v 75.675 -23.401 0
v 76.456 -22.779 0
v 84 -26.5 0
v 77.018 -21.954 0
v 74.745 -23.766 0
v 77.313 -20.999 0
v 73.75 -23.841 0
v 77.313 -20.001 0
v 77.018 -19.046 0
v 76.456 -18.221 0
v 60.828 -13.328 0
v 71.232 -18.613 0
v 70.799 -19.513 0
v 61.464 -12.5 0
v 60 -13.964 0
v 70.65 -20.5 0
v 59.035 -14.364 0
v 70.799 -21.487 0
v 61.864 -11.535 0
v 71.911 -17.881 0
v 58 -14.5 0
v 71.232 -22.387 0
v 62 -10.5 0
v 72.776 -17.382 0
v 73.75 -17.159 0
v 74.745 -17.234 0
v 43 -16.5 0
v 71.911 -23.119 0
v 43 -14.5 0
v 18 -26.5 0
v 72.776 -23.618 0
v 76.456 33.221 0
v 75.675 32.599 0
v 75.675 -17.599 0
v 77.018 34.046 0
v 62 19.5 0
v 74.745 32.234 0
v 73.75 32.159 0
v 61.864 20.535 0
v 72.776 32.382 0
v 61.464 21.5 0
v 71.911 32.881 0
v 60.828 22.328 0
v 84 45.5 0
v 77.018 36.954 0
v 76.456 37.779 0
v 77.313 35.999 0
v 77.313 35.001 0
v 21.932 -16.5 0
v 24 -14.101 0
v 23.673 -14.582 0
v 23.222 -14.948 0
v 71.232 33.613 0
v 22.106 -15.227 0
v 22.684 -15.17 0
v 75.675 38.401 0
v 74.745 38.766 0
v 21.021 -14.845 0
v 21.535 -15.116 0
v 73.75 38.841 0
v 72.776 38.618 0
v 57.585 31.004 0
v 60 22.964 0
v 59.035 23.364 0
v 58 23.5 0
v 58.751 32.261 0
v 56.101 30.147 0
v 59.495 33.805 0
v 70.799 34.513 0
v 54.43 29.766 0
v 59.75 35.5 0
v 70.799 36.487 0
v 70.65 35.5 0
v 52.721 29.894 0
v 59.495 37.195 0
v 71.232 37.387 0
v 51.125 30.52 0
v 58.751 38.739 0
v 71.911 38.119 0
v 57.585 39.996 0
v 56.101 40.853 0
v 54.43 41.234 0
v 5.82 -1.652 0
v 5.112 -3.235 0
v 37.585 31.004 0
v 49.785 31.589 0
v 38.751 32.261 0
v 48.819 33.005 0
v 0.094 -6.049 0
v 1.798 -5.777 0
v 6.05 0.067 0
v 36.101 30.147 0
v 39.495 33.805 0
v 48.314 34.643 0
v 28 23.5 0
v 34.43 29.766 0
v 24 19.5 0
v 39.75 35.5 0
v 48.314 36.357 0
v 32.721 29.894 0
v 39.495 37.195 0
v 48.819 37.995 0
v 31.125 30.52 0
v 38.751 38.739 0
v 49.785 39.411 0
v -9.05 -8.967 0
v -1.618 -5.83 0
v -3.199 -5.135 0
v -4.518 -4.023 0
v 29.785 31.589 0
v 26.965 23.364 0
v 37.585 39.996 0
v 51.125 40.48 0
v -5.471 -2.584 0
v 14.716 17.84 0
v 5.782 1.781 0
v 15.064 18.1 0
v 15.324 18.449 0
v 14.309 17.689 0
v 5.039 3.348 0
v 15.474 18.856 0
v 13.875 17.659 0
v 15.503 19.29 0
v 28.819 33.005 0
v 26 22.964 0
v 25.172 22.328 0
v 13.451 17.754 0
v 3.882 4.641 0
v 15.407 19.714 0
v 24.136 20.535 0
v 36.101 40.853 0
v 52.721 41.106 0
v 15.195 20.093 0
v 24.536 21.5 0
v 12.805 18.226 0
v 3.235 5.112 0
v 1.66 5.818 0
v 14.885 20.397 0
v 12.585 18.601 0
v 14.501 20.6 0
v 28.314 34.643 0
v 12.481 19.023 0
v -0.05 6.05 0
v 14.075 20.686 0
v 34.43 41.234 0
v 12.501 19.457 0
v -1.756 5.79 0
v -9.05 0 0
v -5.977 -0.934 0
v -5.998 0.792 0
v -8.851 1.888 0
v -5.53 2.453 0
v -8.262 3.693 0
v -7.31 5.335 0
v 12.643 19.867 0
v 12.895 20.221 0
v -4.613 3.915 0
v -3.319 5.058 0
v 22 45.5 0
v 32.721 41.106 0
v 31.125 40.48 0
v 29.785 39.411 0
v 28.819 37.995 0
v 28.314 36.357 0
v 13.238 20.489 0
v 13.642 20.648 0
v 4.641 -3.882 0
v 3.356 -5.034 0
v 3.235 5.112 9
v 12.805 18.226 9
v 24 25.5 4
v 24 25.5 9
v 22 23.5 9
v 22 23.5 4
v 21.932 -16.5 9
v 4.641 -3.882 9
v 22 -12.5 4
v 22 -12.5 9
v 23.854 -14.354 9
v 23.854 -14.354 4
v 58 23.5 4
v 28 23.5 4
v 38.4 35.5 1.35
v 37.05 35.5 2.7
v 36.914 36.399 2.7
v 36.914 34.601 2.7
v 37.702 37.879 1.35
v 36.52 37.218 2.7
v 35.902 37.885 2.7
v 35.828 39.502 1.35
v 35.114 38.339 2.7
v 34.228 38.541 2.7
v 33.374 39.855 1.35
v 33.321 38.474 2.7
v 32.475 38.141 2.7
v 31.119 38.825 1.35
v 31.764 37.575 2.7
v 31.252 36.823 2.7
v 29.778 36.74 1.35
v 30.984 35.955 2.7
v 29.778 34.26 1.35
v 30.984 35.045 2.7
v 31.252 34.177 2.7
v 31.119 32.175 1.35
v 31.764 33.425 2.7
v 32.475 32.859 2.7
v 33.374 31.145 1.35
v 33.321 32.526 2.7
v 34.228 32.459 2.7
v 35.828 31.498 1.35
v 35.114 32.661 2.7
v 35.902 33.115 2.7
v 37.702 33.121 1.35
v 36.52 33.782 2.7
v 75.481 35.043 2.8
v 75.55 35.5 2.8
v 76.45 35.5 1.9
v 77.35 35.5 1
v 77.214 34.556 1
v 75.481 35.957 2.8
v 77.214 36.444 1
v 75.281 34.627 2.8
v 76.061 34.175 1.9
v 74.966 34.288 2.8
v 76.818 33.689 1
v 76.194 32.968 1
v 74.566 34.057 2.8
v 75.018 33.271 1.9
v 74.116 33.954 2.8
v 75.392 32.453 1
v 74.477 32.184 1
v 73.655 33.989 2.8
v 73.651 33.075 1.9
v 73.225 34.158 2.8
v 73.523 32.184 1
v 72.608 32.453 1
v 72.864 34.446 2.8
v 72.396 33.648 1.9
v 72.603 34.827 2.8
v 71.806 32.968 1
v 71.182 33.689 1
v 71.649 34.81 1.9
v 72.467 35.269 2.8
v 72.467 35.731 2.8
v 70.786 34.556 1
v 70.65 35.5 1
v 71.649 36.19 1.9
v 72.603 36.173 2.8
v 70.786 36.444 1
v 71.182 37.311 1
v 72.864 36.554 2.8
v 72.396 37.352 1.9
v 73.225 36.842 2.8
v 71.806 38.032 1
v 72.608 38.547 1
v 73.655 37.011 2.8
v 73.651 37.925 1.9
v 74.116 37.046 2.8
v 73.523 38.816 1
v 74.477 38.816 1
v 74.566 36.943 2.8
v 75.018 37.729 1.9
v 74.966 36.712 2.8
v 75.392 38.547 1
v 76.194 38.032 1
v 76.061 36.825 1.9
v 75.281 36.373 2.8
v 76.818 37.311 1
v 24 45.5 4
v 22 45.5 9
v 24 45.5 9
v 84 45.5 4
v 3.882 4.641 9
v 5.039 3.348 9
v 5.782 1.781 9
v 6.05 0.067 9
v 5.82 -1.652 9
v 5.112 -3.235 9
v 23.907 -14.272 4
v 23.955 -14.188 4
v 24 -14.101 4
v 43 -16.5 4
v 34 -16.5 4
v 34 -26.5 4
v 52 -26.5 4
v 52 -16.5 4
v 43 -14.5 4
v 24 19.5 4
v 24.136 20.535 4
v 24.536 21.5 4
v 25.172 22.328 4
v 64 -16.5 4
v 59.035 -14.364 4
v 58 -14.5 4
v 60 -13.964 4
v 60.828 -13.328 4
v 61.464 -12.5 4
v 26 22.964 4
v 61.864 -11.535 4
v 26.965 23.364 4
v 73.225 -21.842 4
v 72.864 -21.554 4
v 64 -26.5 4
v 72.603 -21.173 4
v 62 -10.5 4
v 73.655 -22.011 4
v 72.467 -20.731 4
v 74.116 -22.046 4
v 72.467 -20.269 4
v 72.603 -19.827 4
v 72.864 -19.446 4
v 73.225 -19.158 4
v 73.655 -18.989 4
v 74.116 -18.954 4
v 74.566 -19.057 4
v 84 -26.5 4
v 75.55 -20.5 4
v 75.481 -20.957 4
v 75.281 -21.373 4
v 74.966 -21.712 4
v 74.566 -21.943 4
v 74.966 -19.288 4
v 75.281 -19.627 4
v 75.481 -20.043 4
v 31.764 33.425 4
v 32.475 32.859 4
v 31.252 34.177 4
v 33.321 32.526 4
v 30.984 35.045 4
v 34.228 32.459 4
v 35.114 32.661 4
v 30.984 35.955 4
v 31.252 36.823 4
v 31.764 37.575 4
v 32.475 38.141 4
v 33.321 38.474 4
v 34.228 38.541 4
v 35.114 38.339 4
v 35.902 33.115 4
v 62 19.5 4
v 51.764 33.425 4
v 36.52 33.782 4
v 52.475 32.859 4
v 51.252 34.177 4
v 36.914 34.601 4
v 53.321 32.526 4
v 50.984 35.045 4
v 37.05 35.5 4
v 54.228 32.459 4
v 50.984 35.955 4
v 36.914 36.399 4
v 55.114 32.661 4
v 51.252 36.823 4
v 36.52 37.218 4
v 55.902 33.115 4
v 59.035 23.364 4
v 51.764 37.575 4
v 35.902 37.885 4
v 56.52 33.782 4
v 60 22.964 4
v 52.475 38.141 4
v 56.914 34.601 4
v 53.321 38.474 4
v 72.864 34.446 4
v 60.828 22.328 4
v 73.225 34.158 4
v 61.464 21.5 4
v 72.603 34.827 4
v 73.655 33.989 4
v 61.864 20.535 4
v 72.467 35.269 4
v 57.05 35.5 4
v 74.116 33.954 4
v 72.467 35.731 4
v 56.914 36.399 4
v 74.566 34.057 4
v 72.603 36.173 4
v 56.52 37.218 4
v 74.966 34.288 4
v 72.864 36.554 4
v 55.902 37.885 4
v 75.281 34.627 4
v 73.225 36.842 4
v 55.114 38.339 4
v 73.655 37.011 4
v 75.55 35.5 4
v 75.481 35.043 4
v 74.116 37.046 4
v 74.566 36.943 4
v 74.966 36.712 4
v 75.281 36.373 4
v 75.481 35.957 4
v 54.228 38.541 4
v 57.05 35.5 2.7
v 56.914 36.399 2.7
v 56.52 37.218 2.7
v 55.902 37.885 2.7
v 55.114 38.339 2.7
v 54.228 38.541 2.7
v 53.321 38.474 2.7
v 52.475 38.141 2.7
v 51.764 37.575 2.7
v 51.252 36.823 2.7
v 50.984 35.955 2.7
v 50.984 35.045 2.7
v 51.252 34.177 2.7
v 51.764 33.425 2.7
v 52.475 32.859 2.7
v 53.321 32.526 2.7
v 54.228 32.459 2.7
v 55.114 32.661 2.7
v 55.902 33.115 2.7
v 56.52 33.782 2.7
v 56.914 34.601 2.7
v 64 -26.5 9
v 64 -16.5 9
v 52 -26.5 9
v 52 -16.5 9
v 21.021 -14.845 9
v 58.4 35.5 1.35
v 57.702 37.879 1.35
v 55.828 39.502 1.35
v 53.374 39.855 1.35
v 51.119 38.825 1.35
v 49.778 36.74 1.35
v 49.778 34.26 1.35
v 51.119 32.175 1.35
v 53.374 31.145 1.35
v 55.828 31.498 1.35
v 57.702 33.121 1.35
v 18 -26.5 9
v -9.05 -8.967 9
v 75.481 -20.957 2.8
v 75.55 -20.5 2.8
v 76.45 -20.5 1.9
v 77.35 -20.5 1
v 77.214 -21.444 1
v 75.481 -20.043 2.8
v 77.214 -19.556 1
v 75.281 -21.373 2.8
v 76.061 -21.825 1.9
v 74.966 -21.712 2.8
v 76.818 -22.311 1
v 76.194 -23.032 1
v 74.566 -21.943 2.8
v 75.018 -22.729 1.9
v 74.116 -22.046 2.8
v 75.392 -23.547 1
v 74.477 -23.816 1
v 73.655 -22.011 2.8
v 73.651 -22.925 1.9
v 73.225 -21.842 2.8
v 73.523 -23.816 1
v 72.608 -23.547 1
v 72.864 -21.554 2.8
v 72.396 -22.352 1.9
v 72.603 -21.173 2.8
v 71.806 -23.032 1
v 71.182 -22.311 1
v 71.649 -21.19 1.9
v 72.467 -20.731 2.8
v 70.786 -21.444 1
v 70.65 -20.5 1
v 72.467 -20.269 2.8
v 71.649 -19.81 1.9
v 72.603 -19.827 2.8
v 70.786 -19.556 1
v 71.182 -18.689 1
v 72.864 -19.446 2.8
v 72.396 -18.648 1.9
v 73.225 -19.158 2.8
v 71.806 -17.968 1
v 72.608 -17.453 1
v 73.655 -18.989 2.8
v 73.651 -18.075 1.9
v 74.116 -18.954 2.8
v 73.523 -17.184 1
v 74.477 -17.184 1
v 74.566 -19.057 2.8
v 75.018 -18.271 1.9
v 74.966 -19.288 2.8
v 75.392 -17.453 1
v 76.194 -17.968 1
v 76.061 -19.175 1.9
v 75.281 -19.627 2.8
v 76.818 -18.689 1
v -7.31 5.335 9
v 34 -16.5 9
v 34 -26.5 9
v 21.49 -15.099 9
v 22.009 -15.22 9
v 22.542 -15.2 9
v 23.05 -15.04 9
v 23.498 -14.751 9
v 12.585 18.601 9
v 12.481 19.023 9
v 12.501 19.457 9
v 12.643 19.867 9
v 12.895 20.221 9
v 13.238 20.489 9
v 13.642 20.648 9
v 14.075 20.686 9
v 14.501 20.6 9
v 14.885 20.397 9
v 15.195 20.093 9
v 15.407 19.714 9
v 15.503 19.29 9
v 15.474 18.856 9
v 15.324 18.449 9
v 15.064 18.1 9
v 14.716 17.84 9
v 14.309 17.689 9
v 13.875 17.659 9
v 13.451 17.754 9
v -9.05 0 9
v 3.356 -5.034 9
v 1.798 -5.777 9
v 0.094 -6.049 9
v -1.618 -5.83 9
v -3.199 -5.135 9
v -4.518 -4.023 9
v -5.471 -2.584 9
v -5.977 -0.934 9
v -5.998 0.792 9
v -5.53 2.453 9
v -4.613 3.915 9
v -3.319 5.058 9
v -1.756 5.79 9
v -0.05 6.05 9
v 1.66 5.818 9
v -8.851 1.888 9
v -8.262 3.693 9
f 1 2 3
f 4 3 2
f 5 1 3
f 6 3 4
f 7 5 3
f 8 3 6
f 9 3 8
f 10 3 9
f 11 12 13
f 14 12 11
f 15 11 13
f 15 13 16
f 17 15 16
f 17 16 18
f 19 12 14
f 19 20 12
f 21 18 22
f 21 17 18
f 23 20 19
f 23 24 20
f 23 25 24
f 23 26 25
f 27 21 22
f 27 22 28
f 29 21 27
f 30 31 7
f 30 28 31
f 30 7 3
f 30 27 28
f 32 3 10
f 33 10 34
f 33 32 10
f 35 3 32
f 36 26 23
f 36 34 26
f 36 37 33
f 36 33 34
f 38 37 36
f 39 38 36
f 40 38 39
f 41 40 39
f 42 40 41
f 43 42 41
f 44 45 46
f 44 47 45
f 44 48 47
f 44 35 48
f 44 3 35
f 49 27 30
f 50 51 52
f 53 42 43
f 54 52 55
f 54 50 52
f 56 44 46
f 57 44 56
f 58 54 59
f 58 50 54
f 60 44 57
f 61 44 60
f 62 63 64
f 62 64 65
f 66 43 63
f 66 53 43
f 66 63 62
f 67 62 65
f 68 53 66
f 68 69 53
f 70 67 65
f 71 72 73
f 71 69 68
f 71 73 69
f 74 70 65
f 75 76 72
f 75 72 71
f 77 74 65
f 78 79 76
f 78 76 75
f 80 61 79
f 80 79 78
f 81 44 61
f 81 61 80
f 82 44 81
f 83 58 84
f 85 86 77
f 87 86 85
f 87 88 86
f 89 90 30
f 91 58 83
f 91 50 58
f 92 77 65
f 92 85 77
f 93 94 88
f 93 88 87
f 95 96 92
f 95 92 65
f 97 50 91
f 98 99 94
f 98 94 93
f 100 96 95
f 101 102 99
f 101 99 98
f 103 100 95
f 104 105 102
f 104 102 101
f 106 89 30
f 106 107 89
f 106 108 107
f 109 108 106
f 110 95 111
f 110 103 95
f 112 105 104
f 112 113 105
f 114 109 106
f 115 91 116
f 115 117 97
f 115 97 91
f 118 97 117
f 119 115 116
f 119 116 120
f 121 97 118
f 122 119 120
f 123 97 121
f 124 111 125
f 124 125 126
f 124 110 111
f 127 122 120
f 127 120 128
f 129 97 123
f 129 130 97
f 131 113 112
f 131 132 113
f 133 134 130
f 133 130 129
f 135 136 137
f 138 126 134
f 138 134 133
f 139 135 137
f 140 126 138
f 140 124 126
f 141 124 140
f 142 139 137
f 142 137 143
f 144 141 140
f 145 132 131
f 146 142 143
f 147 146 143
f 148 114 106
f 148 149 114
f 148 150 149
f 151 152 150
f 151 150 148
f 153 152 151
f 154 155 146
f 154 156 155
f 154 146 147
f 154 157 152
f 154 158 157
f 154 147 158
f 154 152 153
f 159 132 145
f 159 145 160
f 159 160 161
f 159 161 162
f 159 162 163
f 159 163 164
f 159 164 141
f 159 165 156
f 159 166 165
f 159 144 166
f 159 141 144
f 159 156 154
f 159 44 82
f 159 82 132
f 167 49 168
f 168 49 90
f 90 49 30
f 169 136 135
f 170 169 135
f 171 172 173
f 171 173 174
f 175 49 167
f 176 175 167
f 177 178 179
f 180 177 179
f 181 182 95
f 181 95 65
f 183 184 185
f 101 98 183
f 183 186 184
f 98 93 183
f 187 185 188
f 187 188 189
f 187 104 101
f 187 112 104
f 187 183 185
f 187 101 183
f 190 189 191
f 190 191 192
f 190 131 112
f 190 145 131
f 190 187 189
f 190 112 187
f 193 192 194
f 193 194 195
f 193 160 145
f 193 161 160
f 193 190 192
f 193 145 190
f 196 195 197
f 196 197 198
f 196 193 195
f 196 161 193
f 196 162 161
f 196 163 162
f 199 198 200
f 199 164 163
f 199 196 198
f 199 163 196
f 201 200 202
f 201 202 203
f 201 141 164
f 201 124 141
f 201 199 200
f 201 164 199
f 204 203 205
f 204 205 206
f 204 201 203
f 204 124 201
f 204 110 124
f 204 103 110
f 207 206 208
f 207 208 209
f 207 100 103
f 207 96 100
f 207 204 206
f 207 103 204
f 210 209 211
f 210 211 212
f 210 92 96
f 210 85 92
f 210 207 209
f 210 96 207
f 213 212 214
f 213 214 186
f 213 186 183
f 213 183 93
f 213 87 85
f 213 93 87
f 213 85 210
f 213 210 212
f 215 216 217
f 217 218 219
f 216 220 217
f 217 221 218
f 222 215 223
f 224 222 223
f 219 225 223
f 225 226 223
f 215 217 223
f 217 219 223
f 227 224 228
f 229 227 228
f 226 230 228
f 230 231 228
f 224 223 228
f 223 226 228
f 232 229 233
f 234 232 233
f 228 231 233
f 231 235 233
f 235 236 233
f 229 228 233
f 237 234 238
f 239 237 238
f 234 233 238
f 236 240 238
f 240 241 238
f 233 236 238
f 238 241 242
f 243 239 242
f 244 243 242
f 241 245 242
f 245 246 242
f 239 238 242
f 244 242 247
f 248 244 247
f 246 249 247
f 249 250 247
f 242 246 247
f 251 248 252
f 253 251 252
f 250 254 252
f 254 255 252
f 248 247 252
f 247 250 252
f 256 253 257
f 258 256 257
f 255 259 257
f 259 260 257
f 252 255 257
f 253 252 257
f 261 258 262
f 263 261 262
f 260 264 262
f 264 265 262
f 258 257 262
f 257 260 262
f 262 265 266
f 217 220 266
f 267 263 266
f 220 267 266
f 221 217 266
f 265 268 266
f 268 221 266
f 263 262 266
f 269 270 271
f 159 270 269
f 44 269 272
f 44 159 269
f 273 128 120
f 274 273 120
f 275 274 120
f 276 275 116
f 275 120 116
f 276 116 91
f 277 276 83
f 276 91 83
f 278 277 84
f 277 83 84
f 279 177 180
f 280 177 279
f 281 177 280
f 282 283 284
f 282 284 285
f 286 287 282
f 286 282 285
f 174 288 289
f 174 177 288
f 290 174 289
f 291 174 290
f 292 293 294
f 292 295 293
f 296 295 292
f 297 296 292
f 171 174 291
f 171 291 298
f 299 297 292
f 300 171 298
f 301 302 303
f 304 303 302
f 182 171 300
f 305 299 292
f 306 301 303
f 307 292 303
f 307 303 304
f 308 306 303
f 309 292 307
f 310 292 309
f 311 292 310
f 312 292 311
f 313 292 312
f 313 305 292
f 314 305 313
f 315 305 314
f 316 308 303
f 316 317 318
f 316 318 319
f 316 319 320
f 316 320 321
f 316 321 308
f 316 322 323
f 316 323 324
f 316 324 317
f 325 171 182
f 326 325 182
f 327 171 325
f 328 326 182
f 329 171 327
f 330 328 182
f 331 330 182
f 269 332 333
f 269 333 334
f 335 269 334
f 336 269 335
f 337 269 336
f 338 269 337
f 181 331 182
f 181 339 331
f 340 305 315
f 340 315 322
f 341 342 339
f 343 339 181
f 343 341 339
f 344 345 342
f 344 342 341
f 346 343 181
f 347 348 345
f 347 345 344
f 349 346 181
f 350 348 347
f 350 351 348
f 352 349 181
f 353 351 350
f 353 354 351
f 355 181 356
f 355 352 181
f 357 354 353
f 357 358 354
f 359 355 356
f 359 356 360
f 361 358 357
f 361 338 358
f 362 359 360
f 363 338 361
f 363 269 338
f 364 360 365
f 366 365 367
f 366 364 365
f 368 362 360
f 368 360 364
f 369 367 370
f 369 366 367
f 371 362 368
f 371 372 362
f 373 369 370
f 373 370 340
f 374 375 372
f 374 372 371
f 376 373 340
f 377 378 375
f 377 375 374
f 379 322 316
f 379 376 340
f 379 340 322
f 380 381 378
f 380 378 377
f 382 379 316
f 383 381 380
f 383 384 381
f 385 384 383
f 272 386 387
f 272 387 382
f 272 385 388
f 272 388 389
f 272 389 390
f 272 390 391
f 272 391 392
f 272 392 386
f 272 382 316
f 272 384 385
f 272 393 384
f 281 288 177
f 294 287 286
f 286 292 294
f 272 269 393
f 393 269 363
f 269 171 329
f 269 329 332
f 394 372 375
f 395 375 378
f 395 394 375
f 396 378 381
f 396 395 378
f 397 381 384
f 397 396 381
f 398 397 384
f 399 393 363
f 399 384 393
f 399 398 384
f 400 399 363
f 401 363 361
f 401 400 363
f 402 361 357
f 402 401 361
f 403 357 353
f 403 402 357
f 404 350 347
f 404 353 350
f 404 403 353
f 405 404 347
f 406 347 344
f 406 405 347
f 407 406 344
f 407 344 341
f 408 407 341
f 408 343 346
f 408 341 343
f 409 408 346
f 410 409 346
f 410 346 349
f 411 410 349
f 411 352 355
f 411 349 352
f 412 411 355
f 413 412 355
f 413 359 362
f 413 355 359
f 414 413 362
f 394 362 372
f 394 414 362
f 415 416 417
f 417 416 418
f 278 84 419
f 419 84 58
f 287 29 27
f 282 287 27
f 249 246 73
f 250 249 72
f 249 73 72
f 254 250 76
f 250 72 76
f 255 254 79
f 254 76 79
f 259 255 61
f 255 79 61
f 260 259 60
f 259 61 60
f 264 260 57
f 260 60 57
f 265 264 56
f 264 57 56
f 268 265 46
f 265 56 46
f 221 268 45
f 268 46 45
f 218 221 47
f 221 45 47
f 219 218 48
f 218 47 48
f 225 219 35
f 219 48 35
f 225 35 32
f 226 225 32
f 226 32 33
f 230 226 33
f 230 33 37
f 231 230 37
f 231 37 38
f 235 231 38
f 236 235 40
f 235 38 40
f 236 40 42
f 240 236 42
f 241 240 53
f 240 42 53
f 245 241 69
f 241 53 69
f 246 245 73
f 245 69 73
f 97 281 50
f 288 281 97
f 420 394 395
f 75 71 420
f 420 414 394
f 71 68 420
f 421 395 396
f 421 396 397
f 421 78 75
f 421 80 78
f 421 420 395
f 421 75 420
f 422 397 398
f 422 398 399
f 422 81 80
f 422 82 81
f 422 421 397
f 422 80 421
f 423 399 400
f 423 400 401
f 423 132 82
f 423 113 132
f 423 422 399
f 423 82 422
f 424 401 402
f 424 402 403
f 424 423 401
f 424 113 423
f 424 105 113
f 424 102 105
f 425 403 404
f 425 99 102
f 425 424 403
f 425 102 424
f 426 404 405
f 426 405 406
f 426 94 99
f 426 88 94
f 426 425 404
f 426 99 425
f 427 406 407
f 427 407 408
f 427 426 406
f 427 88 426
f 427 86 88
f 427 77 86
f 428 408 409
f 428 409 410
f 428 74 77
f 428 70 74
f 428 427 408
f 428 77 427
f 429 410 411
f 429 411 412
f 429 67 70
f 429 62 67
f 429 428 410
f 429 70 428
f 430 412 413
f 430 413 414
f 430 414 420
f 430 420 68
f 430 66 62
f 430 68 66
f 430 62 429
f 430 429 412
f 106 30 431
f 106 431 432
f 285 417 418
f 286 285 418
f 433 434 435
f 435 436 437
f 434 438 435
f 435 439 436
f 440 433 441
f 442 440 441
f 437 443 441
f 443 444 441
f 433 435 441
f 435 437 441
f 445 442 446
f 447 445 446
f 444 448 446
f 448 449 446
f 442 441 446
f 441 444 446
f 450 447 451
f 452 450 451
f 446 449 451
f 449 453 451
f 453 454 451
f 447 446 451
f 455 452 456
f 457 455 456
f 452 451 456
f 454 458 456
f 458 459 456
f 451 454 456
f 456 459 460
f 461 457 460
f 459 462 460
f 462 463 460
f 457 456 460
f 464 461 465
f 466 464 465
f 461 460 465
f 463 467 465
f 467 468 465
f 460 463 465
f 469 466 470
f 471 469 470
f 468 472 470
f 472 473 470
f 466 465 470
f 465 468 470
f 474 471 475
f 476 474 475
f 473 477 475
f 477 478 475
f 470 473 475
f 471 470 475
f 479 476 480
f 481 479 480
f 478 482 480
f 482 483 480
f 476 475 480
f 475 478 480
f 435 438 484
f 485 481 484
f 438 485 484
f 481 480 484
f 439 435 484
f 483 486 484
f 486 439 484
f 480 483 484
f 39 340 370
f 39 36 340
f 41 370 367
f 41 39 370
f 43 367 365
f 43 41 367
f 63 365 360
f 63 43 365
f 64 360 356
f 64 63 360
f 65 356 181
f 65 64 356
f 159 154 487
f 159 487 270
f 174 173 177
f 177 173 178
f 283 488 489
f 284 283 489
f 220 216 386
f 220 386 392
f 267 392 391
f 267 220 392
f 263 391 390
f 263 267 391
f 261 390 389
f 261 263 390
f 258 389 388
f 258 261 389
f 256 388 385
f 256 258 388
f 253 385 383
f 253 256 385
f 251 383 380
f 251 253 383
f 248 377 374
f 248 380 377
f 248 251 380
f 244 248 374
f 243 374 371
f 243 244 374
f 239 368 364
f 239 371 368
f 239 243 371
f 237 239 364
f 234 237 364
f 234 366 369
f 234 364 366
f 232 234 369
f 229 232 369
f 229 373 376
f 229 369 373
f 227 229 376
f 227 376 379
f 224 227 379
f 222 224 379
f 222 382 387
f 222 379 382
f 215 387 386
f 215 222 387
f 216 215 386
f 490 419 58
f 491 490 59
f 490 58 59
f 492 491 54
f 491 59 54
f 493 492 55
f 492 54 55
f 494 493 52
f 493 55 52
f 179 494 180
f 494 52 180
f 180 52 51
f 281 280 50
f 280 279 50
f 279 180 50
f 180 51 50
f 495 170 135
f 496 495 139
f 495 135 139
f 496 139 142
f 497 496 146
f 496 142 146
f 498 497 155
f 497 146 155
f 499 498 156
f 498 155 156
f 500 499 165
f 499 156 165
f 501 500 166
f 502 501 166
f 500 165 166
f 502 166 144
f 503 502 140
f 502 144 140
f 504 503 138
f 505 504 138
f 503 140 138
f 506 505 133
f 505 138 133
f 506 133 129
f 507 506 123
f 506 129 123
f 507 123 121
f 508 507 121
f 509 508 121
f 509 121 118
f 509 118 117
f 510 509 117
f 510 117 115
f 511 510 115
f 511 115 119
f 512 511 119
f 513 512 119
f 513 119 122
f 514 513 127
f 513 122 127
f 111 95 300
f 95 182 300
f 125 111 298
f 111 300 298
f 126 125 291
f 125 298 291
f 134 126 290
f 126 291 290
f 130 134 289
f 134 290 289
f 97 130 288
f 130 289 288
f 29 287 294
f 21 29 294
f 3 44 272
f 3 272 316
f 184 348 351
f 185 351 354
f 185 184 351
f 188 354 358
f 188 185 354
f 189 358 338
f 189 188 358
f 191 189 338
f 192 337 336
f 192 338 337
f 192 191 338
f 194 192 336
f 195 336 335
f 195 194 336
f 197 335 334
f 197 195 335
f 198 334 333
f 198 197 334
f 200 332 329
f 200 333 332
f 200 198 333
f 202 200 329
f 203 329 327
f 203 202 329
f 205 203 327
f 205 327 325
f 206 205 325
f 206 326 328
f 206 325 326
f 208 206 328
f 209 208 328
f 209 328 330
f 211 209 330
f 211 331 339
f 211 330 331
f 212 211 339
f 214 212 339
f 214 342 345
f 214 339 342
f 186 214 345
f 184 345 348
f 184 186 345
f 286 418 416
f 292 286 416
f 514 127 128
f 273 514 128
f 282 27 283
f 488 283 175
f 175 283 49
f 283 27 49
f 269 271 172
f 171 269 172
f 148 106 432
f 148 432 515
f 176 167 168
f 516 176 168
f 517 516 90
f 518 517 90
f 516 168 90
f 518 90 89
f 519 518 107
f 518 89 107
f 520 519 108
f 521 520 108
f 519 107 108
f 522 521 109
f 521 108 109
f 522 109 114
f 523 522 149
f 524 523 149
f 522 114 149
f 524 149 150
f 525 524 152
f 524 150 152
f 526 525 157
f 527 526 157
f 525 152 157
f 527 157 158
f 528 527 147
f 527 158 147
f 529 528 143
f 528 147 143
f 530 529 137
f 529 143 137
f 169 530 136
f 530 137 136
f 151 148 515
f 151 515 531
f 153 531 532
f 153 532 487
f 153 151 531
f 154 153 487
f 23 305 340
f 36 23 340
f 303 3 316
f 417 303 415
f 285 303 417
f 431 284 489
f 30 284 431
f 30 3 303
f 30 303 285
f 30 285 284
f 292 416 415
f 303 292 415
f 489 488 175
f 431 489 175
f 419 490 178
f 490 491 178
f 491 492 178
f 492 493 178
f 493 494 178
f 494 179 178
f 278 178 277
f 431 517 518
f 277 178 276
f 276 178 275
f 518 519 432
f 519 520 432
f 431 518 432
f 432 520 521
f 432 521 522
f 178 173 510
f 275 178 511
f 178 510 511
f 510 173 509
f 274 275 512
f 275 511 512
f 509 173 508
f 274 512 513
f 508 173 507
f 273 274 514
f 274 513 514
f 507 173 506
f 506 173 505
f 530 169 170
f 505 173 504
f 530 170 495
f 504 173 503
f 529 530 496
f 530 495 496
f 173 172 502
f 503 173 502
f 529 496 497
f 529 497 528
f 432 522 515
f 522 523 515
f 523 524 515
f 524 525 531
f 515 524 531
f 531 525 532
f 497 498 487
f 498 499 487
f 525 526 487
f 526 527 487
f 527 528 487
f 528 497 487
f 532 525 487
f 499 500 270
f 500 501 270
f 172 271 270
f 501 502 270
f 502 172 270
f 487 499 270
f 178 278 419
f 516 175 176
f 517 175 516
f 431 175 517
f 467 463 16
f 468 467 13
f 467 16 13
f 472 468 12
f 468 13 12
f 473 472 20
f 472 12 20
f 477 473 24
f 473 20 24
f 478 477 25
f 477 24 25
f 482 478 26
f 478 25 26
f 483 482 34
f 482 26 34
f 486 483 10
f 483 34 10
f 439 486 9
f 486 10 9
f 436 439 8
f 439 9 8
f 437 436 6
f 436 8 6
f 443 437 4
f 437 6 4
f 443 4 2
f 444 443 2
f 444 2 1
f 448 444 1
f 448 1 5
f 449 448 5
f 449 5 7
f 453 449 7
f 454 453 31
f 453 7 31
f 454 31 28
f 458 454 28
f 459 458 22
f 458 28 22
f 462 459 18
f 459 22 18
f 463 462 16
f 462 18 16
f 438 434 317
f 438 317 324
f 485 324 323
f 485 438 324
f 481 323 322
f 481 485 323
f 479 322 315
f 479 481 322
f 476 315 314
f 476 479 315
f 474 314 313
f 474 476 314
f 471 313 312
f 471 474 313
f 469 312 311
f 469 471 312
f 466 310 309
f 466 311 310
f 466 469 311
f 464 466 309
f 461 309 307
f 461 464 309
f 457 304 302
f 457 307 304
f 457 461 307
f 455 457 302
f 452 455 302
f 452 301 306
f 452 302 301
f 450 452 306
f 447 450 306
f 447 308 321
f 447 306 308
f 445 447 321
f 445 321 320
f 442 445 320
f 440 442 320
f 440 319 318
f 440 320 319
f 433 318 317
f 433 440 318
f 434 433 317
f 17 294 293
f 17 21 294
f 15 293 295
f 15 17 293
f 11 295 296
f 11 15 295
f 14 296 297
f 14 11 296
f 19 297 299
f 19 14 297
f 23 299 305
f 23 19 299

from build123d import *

# Parameters (mm, degrees)
SKETCH1_R           = 3.05
SKETCH1_R_2         = 1.55
BOSS_EXTRUDE1_DEPTH = 9
CUT_EXTRUDE1_DEPTH  = 5
CHAMFER2_SIZE       = 2.7
SKETCH3_W           = 38
SKETCH3_H           = 38
CUT_EXTRUDE2_DEPTH  = 96.66216598
FILLET1_R           = 4
CHAMFER3_SIZE       = 2
SKETCH4_R           = 3.35
CUT_EXTRUDE3_DEPTH  = 1
CHAMFER4_SIZE       = 1.8


with BuildPart() as part:
    # Sketch1 → Boss-Extrude1 (new body)
    with BuildSketch(Plane.XY):
        with BuildLine():
            Line((84, 45.5), (84, 24))
            Line((84, 24), (84, -14.5))
            Line((84, -14.5), (84, -26.5))
            Line((84, -26.5), (18, -26.5))
            Line((18, -26.5), (-9.05, -8.967177323))
            Line((-9.05, -8.967177323), (-9.05, 0))
            ThreePointArc((-9.05, 0), (-8.604128548, 2.805614358), (-7.310448193, 5.334777148))
            Line((-7.310448193, 5.334777148), (22, 45.5))
            Line((22, 45.5), (84, 45.5))
        make_face()
        with Locations((34, 35.5)):
            Circle(SKETCH1_R, mode=Mode.SUBTRACT)
        with Locations((54, 35.5)):
            Circle(SKETCH1_R, mode=Mode.SUBTRACT)
        with Locations((74, 35.5)):
            Circle(SKETCH1_R_2, mode=Mode.SUBTRACT)
        with Locations((74, -20.5)):
            Circle(SKETCH1_R_2, mode=Mode.SUBTRACT)
        with BuildLine():
            Line((43, 23.5), (43, 7.5))
            ThreePointArc((43, 7.5), (46, 4.5), (43, 1.5))
            Line((43, 1.5), (43, -16.5))
            Line((43, -16.5), (21.932011766, -16.5))
            Line((21.932011766, -16.5), (4.640610801, -3.881653178))
            ThreePointArc((4.640610801, -3.881653178), (-5.977483288, -0.933913025), (3.235425713, 5.112193312))
            Line((3.235425713, 5.112193312), (12.805005626, 18.22575293))
            ThreePointArc((12.805005626, 18.22575293), (14.884756486, 20.397148397), (13.451233091, 17.75417042))
            Line((13.451233091, 17.75417042), (3.881653178, 4.640610801))
            ThreePointArc((3.881653178, 4.640610801), (5.977483288, 0.933913025), (5.112193312, -3.235425713))
            Line((5.112193312, -3.235425713), (21.021073392, -14.84488216))
            ThreePointArc((21.021073392, -14.84488216), (23.110996656, -15.009801956), (24.2, -13.218419945))
            Line((24.2, -13.218419945), (24, 23.5))
            Line((24, 23.5), (43, 23.5))
        make_face(mode=Mode.SUBTRACT)
    extrude(amount=BOSS_EXTRUDE1_DEPTH)

    # Sketch2 → Cut-Extrude1 (cut)
    with BuildSketch(Plane.XY.offset(9)):
        Polygon((24, 25.5), (22, 25.5), (22, -12.5), (26, -16.5), (34, -16.5), (34, -26.5), (52, -26.5), (52, -16.5), (64, -16.5), (64, -26.5), (84, -26.5), (84, 45.5), (24, 45.5), align=None)
    extrude(amount=-CUT_EXTRUDE1_DEPTH, mode=Mode.SUBTRACT)

    # Chamfer2
    chamfer2_edges = [part.edges().sort_by_distance(p)[0] for p in [
        (30.95, 35.5, 0),
        (50.95, 35.5, 0),
    ]]
    chamfer(chamfer2_edges, length=CHAMFER2_SIZE)

    # Sketch3 → Cut-Extrude2 (cut, through all)
    with BuildSketch(Plane.XY.offset(4)):
        with Locations((43, 4.5)):
            Rectangle(SKETCH3_W, SKETCH3_H)
    extrude(amount=-CUT_EXTRUDE2_DEPTH, mode=Mode.SUBTRACT)

    # Fillet1
    fillet1_edges = [part.edges().sort_by_distance(p)[0] for p in [
        (62, 23.5, 2),
        (62, -14.5, 2),
        (24, 23.5, 2),
    ]]
    fillet(fillet1_edges, radius=FILLET1_R)

    # Chamfer3
    chamfer3_edges = [part.edges().sort_by_distance(p)[0] for p in [
        (22, 25.5, 6.5),
    ]]
    chamfer(chamfer3_edges, length=CHAMFER3_SIZE - 0.0001)  # a hair under: the kernel refuses the full size

    # Sketch4 → Cut-Extrude3 (cut)
    with BuildSketch(Plane(origin=(0, 0, 0), x_dir=(-1, 0, 0), z_dir=(0, 0, -1))):
        with Locations((-74, 35.5)):
            Circle(SKETCH4_R)
        with Locations((-74, -20.5)):
            Circle(SKETCH4_R)
    extrude(amount=-CUT_EXTRUDE3_DEPTH, mode=Mode.SUBTRACT)

    # Chamfer4
    chamfer4_edges = [part.edges().sort_by_distance(p)[0] for p in [
        (72.45, 35.5, 1),
        (72.45, -20.5, 1),
    ]]
    chamfer(chamfer4_edges, length=CHAMFER4_SIZE - 0.0001)  # a hair under: the kernel refuses the full size


solid = part.part
